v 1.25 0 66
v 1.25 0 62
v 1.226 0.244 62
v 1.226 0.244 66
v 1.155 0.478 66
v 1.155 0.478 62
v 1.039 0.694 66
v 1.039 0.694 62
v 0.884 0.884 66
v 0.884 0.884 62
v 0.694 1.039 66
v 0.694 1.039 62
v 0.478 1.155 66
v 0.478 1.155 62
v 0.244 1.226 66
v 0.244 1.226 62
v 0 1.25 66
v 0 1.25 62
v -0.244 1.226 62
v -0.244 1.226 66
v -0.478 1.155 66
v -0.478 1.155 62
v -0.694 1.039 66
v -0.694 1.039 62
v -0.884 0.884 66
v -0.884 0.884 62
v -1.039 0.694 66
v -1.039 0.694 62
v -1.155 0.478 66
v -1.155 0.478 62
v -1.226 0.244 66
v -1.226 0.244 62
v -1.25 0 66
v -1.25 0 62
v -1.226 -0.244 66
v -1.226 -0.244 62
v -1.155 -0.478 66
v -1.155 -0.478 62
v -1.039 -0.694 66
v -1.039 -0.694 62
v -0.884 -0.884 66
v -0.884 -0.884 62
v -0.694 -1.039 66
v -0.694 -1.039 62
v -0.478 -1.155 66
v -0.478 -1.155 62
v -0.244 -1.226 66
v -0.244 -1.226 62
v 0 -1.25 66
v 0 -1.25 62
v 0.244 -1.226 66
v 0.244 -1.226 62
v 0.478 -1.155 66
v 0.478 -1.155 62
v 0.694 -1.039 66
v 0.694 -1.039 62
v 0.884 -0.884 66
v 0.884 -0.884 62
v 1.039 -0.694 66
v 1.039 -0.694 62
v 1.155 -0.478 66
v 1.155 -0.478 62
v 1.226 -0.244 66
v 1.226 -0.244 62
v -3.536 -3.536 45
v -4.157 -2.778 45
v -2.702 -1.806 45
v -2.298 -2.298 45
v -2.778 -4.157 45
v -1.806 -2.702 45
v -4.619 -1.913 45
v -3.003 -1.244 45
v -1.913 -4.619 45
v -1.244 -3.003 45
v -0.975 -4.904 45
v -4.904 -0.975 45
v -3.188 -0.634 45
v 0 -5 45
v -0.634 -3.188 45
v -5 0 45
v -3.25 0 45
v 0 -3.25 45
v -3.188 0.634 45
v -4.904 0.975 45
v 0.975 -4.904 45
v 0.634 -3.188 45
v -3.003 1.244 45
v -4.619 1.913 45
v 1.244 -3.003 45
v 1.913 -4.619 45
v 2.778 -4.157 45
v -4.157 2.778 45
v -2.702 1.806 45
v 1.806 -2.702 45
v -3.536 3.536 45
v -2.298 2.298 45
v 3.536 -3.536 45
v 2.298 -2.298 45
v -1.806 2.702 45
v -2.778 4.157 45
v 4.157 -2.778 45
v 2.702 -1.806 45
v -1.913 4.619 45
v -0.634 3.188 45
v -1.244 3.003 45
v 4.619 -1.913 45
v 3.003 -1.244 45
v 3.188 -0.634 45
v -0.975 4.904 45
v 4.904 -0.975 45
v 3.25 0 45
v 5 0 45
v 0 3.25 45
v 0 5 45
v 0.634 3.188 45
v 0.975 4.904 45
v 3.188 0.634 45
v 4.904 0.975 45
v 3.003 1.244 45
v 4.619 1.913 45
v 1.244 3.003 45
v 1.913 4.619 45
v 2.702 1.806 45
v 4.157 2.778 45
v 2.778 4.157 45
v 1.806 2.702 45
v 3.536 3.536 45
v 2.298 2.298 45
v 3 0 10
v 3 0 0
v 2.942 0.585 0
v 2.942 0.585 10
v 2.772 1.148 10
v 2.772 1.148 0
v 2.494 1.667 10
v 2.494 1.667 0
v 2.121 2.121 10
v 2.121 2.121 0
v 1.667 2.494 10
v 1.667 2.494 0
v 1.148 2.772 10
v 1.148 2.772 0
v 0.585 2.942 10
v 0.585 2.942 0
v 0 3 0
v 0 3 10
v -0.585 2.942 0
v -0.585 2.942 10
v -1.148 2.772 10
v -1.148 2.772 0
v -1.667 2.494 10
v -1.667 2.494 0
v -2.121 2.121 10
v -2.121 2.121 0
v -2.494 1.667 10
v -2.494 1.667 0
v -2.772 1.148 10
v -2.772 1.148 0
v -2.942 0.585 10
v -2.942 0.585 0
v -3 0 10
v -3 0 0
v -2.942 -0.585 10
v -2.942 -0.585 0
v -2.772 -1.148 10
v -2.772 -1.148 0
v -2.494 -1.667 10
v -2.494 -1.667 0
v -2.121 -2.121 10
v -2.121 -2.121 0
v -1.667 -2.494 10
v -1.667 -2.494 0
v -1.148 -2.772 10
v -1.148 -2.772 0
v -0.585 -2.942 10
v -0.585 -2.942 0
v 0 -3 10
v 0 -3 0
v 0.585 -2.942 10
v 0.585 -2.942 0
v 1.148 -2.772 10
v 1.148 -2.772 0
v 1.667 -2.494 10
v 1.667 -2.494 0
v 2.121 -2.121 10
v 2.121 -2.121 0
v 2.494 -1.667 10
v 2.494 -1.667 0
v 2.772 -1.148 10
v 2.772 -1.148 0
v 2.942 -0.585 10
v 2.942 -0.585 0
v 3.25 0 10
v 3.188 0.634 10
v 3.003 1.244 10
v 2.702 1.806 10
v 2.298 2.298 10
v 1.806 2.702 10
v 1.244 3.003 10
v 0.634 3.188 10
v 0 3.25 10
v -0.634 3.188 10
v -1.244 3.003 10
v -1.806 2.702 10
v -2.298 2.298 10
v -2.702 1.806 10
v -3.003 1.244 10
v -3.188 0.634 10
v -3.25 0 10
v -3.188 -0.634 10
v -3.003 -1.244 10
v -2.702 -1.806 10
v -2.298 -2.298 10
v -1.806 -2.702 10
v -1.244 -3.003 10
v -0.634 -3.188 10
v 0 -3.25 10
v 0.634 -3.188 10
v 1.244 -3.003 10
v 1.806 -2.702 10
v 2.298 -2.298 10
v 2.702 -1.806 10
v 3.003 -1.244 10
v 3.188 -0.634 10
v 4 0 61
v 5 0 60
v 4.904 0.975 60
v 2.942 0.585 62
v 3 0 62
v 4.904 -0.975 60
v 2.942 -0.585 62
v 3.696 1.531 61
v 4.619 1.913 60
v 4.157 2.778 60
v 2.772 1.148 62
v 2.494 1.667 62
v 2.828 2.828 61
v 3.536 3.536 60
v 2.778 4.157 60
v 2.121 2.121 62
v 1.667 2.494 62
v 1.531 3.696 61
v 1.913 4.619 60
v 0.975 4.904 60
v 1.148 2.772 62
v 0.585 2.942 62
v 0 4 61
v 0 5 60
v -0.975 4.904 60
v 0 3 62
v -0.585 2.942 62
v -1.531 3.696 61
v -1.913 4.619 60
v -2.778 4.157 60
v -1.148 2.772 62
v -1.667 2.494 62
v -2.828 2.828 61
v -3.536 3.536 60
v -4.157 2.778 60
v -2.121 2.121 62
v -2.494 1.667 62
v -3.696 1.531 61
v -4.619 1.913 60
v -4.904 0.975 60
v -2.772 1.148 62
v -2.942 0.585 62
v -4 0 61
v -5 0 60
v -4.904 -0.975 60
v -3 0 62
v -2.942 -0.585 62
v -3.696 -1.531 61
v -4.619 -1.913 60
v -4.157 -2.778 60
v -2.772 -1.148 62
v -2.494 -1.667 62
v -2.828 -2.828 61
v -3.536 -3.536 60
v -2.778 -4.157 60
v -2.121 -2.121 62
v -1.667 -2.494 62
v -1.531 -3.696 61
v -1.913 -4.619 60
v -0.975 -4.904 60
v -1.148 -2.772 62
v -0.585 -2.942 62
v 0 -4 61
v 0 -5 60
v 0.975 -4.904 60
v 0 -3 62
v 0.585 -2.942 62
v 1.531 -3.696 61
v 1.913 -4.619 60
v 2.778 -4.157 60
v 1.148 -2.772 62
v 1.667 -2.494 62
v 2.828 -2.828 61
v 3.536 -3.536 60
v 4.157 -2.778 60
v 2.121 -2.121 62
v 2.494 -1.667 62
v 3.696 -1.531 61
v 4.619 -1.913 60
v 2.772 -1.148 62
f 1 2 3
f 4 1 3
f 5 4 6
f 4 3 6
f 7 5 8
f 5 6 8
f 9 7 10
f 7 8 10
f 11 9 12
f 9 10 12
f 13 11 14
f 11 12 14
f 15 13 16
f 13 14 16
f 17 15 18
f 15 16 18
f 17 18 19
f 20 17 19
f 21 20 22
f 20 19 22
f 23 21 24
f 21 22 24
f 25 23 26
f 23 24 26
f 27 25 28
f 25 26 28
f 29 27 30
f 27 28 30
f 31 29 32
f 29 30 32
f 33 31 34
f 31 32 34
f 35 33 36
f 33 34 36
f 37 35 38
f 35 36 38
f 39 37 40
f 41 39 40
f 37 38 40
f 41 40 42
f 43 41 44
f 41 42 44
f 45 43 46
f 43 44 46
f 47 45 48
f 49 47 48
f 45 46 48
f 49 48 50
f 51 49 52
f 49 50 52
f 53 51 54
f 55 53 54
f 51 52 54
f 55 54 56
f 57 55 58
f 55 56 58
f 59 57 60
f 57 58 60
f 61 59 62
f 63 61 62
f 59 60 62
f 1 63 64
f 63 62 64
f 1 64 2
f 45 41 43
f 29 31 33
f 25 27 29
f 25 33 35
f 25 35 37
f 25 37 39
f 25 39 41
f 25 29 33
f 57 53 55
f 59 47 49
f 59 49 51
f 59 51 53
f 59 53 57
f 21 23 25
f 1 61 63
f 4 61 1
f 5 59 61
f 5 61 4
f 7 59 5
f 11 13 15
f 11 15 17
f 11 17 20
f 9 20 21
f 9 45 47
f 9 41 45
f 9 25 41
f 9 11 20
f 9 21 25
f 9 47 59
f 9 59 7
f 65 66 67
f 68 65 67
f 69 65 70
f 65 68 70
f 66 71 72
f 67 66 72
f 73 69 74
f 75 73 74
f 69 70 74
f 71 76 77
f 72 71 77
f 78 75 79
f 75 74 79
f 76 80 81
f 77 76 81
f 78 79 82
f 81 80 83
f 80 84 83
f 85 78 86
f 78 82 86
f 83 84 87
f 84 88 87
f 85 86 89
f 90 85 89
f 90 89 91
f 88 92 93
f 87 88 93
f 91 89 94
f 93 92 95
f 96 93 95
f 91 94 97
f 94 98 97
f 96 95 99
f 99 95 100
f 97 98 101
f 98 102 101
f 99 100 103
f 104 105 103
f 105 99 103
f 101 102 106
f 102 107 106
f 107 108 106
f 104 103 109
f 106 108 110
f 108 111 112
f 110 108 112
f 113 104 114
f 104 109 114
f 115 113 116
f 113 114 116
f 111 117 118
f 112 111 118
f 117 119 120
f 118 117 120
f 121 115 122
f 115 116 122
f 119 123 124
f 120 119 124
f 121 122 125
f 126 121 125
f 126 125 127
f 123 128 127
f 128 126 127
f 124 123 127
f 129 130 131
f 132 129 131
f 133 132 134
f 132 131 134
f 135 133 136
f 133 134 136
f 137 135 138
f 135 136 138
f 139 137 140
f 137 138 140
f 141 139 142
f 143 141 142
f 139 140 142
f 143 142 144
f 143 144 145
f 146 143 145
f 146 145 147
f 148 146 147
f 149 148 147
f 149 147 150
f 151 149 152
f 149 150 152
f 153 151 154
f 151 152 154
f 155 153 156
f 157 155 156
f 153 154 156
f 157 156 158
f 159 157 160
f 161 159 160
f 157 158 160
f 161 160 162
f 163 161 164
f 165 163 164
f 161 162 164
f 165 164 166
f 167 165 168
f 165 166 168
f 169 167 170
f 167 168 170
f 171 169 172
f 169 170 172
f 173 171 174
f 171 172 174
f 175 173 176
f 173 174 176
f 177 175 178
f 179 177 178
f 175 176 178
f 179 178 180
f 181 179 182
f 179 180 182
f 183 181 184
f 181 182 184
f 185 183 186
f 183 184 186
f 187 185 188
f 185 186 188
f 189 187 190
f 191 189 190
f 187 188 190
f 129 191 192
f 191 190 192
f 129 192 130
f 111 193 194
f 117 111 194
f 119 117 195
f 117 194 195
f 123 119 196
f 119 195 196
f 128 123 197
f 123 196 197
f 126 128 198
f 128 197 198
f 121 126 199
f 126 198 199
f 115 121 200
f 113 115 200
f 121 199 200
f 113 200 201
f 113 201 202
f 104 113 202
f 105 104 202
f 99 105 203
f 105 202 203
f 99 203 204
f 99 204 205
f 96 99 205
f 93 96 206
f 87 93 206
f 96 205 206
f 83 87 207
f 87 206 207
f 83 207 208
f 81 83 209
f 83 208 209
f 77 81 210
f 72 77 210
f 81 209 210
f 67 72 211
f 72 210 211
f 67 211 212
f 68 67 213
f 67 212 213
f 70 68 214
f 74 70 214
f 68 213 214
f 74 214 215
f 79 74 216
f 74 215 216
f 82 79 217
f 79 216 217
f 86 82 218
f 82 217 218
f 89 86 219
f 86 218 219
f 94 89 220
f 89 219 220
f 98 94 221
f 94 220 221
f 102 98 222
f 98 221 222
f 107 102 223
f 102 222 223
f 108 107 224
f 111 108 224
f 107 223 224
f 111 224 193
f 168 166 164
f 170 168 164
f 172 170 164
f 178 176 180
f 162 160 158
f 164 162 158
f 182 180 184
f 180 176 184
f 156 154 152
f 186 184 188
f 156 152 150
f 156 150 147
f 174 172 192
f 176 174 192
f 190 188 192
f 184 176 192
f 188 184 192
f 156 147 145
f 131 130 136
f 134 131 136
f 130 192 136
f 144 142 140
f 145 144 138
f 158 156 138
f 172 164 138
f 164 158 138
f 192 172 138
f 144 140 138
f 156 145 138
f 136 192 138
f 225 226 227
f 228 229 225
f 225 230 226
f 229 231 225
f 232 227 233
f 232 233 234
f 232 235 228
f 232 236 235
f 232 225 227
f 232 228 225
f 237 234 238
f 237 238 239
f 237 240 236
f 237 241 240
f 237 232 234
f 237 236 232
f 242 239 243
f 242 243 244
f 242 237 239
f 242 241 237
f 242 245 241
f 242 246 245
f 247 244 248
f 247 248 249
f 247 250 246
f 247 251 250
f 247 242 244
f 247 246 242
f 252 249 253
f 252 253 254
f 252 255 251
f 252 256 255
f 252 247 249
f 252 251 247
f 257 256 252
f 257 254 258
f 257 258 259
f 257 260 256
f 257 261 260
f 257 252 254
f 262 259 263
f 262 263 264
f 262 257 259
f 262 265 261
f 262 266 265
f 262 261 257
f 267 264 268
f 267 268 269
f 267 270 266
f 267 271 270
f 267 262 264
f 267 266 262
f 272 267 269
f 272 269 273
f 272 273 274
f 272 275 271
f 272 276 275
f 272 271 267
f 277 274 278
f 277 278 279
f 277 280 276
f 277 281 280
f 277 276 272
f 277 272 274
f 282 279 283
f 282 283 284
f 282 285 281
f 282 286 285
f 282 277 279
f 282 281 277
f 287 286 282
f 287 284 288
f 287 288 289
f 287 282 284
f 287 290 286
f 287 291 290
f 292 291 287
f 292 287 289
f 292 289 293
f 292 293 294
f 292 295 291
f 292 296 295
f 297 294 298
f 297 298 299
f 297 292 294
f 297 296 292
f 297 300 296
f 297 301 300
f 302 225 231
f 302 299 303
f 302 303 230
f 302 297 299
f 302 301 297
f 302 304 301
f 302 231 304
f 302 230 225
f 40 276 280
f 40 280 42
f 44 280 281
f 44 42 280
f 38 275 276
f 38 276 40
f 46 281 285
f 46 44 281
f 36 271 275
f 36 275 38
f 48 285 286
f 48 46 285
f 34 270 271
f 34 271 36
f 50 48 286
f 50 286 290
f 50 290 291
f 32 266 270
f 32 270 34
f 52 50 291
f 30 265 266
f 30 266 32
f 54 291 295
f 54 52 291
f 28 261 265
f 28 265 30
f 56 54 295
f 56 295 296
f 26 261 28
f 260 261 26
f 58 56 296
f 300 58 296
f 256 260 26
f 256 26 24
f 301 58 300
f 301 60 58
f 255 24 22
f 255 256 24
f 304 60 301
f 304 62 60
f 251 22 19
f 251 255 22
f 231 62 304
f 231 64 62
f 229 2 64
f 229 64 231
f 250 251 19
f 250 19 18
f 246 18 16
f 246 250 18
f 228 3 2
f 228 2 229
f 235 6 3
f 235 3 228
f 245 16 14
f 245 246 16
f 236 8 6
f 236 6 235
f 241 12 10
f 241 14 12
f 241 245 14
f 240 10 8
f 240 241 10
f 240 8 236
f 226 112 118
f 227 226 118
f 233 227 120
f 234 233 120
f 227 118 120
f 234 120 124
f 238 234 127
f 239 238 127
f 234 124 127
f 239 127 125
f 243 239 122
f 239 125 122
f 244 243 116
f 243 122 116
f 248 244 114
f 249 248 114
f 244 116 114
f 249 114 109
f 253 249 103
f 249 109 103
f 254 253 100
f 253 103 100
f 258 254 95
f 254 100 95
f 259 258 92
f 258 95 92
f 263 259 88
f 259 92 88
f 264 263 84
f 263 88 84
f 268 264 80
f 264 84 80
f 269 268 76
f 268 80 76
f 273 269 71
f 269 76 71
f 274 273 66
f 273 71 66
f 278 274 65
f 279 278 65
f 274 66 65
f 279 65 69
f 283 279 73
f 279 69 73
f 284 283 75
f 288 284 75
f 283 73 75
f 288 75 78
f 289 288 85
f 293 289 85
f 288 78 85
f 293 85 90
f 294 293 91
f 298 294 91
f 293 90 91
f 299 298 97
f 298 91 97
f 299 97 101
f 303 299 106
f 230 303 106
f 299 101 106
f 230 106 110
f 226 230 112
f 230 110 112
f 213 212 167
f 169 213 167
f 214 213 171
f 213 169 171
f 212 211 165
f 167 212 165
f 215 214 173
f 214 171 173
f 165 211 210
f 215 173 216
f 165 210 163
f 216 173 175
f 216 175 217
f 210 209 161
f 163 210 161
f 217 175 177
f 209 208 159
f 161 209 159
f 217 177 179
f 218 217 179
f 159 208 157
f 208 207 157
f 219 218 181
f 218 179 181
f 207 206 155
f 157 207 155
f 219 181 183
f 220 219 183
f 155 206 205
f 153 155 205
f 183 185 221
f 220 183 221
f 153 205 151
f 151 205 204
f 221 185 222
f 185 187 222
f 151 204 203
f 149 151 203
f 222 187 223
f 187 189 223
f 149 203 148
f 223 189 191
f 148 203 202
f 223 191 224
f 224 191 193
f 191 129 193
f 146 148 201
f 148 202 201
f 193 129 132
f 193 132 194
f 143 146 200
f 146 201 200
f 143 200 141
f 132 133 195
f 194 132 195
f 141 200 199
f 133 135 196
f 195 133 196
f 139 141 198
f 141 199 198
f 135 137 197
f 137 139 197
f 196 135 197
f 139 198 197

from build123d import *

# Parameters (mm, degrees)
CROQUIS1_R              = 3
SALIENTE_EXTRUIR1_DEPTH = 10
CROQUIS2_R              = 3.25
SALIENTE_EXTRUIR2_DEPTH = 35
CROQUIS3_R              = 5
SALIENTE_EXTRUIR3_DEPTH = 17
CHAFL_N1_SIZE           = 2
CROQUIS4_R              = 1.25
SALIENTE_EXTRUIR4_DEPTH = 4


with BuildPart() as part:
    # Croquis1 → Saliente-Extruir1 (new body)
    with BuildSketch(Plane.XY):
        Circle(CROQUIS1_R)
    extrude(amount=SALIENTE_EXTRUIR1_DEPTH)

    # Croquis2 → Saliente-Extruir2 (add)
    with BuildSketch(Plane.XY.offset(10)):
        Circle(CROQUIS2_R)
    extrude(amount=SALIENTE_EXTRUIR2_DEPTH)

    # Croquis3 → Saliente-Extruir3 (add)
    with BuildSketch(Plane.XY.offset(45)):
        Circle(CROQUIS3_R)
    extrude(amount=SALIENTE_EXTRUIR3_DEPTH)

    # Chaflán1
    chafl_n1_edges = [part.edges().sort_by_distance(p)[0] for p in [
        (-5, 0, 62),
    ]]
    chamfer(chafl_n1_edges, length=CHAFL_N1_SIZE)

    # Croquis4 → Saliente-Extruir4 (add)
    with BuildSketch(Plane.XY.offset(62)):
        Circle(CROQUIS4_R)
    extrude(amount=SALIENTE_EXTRUIR4_DEPTH)


solid = part.part
